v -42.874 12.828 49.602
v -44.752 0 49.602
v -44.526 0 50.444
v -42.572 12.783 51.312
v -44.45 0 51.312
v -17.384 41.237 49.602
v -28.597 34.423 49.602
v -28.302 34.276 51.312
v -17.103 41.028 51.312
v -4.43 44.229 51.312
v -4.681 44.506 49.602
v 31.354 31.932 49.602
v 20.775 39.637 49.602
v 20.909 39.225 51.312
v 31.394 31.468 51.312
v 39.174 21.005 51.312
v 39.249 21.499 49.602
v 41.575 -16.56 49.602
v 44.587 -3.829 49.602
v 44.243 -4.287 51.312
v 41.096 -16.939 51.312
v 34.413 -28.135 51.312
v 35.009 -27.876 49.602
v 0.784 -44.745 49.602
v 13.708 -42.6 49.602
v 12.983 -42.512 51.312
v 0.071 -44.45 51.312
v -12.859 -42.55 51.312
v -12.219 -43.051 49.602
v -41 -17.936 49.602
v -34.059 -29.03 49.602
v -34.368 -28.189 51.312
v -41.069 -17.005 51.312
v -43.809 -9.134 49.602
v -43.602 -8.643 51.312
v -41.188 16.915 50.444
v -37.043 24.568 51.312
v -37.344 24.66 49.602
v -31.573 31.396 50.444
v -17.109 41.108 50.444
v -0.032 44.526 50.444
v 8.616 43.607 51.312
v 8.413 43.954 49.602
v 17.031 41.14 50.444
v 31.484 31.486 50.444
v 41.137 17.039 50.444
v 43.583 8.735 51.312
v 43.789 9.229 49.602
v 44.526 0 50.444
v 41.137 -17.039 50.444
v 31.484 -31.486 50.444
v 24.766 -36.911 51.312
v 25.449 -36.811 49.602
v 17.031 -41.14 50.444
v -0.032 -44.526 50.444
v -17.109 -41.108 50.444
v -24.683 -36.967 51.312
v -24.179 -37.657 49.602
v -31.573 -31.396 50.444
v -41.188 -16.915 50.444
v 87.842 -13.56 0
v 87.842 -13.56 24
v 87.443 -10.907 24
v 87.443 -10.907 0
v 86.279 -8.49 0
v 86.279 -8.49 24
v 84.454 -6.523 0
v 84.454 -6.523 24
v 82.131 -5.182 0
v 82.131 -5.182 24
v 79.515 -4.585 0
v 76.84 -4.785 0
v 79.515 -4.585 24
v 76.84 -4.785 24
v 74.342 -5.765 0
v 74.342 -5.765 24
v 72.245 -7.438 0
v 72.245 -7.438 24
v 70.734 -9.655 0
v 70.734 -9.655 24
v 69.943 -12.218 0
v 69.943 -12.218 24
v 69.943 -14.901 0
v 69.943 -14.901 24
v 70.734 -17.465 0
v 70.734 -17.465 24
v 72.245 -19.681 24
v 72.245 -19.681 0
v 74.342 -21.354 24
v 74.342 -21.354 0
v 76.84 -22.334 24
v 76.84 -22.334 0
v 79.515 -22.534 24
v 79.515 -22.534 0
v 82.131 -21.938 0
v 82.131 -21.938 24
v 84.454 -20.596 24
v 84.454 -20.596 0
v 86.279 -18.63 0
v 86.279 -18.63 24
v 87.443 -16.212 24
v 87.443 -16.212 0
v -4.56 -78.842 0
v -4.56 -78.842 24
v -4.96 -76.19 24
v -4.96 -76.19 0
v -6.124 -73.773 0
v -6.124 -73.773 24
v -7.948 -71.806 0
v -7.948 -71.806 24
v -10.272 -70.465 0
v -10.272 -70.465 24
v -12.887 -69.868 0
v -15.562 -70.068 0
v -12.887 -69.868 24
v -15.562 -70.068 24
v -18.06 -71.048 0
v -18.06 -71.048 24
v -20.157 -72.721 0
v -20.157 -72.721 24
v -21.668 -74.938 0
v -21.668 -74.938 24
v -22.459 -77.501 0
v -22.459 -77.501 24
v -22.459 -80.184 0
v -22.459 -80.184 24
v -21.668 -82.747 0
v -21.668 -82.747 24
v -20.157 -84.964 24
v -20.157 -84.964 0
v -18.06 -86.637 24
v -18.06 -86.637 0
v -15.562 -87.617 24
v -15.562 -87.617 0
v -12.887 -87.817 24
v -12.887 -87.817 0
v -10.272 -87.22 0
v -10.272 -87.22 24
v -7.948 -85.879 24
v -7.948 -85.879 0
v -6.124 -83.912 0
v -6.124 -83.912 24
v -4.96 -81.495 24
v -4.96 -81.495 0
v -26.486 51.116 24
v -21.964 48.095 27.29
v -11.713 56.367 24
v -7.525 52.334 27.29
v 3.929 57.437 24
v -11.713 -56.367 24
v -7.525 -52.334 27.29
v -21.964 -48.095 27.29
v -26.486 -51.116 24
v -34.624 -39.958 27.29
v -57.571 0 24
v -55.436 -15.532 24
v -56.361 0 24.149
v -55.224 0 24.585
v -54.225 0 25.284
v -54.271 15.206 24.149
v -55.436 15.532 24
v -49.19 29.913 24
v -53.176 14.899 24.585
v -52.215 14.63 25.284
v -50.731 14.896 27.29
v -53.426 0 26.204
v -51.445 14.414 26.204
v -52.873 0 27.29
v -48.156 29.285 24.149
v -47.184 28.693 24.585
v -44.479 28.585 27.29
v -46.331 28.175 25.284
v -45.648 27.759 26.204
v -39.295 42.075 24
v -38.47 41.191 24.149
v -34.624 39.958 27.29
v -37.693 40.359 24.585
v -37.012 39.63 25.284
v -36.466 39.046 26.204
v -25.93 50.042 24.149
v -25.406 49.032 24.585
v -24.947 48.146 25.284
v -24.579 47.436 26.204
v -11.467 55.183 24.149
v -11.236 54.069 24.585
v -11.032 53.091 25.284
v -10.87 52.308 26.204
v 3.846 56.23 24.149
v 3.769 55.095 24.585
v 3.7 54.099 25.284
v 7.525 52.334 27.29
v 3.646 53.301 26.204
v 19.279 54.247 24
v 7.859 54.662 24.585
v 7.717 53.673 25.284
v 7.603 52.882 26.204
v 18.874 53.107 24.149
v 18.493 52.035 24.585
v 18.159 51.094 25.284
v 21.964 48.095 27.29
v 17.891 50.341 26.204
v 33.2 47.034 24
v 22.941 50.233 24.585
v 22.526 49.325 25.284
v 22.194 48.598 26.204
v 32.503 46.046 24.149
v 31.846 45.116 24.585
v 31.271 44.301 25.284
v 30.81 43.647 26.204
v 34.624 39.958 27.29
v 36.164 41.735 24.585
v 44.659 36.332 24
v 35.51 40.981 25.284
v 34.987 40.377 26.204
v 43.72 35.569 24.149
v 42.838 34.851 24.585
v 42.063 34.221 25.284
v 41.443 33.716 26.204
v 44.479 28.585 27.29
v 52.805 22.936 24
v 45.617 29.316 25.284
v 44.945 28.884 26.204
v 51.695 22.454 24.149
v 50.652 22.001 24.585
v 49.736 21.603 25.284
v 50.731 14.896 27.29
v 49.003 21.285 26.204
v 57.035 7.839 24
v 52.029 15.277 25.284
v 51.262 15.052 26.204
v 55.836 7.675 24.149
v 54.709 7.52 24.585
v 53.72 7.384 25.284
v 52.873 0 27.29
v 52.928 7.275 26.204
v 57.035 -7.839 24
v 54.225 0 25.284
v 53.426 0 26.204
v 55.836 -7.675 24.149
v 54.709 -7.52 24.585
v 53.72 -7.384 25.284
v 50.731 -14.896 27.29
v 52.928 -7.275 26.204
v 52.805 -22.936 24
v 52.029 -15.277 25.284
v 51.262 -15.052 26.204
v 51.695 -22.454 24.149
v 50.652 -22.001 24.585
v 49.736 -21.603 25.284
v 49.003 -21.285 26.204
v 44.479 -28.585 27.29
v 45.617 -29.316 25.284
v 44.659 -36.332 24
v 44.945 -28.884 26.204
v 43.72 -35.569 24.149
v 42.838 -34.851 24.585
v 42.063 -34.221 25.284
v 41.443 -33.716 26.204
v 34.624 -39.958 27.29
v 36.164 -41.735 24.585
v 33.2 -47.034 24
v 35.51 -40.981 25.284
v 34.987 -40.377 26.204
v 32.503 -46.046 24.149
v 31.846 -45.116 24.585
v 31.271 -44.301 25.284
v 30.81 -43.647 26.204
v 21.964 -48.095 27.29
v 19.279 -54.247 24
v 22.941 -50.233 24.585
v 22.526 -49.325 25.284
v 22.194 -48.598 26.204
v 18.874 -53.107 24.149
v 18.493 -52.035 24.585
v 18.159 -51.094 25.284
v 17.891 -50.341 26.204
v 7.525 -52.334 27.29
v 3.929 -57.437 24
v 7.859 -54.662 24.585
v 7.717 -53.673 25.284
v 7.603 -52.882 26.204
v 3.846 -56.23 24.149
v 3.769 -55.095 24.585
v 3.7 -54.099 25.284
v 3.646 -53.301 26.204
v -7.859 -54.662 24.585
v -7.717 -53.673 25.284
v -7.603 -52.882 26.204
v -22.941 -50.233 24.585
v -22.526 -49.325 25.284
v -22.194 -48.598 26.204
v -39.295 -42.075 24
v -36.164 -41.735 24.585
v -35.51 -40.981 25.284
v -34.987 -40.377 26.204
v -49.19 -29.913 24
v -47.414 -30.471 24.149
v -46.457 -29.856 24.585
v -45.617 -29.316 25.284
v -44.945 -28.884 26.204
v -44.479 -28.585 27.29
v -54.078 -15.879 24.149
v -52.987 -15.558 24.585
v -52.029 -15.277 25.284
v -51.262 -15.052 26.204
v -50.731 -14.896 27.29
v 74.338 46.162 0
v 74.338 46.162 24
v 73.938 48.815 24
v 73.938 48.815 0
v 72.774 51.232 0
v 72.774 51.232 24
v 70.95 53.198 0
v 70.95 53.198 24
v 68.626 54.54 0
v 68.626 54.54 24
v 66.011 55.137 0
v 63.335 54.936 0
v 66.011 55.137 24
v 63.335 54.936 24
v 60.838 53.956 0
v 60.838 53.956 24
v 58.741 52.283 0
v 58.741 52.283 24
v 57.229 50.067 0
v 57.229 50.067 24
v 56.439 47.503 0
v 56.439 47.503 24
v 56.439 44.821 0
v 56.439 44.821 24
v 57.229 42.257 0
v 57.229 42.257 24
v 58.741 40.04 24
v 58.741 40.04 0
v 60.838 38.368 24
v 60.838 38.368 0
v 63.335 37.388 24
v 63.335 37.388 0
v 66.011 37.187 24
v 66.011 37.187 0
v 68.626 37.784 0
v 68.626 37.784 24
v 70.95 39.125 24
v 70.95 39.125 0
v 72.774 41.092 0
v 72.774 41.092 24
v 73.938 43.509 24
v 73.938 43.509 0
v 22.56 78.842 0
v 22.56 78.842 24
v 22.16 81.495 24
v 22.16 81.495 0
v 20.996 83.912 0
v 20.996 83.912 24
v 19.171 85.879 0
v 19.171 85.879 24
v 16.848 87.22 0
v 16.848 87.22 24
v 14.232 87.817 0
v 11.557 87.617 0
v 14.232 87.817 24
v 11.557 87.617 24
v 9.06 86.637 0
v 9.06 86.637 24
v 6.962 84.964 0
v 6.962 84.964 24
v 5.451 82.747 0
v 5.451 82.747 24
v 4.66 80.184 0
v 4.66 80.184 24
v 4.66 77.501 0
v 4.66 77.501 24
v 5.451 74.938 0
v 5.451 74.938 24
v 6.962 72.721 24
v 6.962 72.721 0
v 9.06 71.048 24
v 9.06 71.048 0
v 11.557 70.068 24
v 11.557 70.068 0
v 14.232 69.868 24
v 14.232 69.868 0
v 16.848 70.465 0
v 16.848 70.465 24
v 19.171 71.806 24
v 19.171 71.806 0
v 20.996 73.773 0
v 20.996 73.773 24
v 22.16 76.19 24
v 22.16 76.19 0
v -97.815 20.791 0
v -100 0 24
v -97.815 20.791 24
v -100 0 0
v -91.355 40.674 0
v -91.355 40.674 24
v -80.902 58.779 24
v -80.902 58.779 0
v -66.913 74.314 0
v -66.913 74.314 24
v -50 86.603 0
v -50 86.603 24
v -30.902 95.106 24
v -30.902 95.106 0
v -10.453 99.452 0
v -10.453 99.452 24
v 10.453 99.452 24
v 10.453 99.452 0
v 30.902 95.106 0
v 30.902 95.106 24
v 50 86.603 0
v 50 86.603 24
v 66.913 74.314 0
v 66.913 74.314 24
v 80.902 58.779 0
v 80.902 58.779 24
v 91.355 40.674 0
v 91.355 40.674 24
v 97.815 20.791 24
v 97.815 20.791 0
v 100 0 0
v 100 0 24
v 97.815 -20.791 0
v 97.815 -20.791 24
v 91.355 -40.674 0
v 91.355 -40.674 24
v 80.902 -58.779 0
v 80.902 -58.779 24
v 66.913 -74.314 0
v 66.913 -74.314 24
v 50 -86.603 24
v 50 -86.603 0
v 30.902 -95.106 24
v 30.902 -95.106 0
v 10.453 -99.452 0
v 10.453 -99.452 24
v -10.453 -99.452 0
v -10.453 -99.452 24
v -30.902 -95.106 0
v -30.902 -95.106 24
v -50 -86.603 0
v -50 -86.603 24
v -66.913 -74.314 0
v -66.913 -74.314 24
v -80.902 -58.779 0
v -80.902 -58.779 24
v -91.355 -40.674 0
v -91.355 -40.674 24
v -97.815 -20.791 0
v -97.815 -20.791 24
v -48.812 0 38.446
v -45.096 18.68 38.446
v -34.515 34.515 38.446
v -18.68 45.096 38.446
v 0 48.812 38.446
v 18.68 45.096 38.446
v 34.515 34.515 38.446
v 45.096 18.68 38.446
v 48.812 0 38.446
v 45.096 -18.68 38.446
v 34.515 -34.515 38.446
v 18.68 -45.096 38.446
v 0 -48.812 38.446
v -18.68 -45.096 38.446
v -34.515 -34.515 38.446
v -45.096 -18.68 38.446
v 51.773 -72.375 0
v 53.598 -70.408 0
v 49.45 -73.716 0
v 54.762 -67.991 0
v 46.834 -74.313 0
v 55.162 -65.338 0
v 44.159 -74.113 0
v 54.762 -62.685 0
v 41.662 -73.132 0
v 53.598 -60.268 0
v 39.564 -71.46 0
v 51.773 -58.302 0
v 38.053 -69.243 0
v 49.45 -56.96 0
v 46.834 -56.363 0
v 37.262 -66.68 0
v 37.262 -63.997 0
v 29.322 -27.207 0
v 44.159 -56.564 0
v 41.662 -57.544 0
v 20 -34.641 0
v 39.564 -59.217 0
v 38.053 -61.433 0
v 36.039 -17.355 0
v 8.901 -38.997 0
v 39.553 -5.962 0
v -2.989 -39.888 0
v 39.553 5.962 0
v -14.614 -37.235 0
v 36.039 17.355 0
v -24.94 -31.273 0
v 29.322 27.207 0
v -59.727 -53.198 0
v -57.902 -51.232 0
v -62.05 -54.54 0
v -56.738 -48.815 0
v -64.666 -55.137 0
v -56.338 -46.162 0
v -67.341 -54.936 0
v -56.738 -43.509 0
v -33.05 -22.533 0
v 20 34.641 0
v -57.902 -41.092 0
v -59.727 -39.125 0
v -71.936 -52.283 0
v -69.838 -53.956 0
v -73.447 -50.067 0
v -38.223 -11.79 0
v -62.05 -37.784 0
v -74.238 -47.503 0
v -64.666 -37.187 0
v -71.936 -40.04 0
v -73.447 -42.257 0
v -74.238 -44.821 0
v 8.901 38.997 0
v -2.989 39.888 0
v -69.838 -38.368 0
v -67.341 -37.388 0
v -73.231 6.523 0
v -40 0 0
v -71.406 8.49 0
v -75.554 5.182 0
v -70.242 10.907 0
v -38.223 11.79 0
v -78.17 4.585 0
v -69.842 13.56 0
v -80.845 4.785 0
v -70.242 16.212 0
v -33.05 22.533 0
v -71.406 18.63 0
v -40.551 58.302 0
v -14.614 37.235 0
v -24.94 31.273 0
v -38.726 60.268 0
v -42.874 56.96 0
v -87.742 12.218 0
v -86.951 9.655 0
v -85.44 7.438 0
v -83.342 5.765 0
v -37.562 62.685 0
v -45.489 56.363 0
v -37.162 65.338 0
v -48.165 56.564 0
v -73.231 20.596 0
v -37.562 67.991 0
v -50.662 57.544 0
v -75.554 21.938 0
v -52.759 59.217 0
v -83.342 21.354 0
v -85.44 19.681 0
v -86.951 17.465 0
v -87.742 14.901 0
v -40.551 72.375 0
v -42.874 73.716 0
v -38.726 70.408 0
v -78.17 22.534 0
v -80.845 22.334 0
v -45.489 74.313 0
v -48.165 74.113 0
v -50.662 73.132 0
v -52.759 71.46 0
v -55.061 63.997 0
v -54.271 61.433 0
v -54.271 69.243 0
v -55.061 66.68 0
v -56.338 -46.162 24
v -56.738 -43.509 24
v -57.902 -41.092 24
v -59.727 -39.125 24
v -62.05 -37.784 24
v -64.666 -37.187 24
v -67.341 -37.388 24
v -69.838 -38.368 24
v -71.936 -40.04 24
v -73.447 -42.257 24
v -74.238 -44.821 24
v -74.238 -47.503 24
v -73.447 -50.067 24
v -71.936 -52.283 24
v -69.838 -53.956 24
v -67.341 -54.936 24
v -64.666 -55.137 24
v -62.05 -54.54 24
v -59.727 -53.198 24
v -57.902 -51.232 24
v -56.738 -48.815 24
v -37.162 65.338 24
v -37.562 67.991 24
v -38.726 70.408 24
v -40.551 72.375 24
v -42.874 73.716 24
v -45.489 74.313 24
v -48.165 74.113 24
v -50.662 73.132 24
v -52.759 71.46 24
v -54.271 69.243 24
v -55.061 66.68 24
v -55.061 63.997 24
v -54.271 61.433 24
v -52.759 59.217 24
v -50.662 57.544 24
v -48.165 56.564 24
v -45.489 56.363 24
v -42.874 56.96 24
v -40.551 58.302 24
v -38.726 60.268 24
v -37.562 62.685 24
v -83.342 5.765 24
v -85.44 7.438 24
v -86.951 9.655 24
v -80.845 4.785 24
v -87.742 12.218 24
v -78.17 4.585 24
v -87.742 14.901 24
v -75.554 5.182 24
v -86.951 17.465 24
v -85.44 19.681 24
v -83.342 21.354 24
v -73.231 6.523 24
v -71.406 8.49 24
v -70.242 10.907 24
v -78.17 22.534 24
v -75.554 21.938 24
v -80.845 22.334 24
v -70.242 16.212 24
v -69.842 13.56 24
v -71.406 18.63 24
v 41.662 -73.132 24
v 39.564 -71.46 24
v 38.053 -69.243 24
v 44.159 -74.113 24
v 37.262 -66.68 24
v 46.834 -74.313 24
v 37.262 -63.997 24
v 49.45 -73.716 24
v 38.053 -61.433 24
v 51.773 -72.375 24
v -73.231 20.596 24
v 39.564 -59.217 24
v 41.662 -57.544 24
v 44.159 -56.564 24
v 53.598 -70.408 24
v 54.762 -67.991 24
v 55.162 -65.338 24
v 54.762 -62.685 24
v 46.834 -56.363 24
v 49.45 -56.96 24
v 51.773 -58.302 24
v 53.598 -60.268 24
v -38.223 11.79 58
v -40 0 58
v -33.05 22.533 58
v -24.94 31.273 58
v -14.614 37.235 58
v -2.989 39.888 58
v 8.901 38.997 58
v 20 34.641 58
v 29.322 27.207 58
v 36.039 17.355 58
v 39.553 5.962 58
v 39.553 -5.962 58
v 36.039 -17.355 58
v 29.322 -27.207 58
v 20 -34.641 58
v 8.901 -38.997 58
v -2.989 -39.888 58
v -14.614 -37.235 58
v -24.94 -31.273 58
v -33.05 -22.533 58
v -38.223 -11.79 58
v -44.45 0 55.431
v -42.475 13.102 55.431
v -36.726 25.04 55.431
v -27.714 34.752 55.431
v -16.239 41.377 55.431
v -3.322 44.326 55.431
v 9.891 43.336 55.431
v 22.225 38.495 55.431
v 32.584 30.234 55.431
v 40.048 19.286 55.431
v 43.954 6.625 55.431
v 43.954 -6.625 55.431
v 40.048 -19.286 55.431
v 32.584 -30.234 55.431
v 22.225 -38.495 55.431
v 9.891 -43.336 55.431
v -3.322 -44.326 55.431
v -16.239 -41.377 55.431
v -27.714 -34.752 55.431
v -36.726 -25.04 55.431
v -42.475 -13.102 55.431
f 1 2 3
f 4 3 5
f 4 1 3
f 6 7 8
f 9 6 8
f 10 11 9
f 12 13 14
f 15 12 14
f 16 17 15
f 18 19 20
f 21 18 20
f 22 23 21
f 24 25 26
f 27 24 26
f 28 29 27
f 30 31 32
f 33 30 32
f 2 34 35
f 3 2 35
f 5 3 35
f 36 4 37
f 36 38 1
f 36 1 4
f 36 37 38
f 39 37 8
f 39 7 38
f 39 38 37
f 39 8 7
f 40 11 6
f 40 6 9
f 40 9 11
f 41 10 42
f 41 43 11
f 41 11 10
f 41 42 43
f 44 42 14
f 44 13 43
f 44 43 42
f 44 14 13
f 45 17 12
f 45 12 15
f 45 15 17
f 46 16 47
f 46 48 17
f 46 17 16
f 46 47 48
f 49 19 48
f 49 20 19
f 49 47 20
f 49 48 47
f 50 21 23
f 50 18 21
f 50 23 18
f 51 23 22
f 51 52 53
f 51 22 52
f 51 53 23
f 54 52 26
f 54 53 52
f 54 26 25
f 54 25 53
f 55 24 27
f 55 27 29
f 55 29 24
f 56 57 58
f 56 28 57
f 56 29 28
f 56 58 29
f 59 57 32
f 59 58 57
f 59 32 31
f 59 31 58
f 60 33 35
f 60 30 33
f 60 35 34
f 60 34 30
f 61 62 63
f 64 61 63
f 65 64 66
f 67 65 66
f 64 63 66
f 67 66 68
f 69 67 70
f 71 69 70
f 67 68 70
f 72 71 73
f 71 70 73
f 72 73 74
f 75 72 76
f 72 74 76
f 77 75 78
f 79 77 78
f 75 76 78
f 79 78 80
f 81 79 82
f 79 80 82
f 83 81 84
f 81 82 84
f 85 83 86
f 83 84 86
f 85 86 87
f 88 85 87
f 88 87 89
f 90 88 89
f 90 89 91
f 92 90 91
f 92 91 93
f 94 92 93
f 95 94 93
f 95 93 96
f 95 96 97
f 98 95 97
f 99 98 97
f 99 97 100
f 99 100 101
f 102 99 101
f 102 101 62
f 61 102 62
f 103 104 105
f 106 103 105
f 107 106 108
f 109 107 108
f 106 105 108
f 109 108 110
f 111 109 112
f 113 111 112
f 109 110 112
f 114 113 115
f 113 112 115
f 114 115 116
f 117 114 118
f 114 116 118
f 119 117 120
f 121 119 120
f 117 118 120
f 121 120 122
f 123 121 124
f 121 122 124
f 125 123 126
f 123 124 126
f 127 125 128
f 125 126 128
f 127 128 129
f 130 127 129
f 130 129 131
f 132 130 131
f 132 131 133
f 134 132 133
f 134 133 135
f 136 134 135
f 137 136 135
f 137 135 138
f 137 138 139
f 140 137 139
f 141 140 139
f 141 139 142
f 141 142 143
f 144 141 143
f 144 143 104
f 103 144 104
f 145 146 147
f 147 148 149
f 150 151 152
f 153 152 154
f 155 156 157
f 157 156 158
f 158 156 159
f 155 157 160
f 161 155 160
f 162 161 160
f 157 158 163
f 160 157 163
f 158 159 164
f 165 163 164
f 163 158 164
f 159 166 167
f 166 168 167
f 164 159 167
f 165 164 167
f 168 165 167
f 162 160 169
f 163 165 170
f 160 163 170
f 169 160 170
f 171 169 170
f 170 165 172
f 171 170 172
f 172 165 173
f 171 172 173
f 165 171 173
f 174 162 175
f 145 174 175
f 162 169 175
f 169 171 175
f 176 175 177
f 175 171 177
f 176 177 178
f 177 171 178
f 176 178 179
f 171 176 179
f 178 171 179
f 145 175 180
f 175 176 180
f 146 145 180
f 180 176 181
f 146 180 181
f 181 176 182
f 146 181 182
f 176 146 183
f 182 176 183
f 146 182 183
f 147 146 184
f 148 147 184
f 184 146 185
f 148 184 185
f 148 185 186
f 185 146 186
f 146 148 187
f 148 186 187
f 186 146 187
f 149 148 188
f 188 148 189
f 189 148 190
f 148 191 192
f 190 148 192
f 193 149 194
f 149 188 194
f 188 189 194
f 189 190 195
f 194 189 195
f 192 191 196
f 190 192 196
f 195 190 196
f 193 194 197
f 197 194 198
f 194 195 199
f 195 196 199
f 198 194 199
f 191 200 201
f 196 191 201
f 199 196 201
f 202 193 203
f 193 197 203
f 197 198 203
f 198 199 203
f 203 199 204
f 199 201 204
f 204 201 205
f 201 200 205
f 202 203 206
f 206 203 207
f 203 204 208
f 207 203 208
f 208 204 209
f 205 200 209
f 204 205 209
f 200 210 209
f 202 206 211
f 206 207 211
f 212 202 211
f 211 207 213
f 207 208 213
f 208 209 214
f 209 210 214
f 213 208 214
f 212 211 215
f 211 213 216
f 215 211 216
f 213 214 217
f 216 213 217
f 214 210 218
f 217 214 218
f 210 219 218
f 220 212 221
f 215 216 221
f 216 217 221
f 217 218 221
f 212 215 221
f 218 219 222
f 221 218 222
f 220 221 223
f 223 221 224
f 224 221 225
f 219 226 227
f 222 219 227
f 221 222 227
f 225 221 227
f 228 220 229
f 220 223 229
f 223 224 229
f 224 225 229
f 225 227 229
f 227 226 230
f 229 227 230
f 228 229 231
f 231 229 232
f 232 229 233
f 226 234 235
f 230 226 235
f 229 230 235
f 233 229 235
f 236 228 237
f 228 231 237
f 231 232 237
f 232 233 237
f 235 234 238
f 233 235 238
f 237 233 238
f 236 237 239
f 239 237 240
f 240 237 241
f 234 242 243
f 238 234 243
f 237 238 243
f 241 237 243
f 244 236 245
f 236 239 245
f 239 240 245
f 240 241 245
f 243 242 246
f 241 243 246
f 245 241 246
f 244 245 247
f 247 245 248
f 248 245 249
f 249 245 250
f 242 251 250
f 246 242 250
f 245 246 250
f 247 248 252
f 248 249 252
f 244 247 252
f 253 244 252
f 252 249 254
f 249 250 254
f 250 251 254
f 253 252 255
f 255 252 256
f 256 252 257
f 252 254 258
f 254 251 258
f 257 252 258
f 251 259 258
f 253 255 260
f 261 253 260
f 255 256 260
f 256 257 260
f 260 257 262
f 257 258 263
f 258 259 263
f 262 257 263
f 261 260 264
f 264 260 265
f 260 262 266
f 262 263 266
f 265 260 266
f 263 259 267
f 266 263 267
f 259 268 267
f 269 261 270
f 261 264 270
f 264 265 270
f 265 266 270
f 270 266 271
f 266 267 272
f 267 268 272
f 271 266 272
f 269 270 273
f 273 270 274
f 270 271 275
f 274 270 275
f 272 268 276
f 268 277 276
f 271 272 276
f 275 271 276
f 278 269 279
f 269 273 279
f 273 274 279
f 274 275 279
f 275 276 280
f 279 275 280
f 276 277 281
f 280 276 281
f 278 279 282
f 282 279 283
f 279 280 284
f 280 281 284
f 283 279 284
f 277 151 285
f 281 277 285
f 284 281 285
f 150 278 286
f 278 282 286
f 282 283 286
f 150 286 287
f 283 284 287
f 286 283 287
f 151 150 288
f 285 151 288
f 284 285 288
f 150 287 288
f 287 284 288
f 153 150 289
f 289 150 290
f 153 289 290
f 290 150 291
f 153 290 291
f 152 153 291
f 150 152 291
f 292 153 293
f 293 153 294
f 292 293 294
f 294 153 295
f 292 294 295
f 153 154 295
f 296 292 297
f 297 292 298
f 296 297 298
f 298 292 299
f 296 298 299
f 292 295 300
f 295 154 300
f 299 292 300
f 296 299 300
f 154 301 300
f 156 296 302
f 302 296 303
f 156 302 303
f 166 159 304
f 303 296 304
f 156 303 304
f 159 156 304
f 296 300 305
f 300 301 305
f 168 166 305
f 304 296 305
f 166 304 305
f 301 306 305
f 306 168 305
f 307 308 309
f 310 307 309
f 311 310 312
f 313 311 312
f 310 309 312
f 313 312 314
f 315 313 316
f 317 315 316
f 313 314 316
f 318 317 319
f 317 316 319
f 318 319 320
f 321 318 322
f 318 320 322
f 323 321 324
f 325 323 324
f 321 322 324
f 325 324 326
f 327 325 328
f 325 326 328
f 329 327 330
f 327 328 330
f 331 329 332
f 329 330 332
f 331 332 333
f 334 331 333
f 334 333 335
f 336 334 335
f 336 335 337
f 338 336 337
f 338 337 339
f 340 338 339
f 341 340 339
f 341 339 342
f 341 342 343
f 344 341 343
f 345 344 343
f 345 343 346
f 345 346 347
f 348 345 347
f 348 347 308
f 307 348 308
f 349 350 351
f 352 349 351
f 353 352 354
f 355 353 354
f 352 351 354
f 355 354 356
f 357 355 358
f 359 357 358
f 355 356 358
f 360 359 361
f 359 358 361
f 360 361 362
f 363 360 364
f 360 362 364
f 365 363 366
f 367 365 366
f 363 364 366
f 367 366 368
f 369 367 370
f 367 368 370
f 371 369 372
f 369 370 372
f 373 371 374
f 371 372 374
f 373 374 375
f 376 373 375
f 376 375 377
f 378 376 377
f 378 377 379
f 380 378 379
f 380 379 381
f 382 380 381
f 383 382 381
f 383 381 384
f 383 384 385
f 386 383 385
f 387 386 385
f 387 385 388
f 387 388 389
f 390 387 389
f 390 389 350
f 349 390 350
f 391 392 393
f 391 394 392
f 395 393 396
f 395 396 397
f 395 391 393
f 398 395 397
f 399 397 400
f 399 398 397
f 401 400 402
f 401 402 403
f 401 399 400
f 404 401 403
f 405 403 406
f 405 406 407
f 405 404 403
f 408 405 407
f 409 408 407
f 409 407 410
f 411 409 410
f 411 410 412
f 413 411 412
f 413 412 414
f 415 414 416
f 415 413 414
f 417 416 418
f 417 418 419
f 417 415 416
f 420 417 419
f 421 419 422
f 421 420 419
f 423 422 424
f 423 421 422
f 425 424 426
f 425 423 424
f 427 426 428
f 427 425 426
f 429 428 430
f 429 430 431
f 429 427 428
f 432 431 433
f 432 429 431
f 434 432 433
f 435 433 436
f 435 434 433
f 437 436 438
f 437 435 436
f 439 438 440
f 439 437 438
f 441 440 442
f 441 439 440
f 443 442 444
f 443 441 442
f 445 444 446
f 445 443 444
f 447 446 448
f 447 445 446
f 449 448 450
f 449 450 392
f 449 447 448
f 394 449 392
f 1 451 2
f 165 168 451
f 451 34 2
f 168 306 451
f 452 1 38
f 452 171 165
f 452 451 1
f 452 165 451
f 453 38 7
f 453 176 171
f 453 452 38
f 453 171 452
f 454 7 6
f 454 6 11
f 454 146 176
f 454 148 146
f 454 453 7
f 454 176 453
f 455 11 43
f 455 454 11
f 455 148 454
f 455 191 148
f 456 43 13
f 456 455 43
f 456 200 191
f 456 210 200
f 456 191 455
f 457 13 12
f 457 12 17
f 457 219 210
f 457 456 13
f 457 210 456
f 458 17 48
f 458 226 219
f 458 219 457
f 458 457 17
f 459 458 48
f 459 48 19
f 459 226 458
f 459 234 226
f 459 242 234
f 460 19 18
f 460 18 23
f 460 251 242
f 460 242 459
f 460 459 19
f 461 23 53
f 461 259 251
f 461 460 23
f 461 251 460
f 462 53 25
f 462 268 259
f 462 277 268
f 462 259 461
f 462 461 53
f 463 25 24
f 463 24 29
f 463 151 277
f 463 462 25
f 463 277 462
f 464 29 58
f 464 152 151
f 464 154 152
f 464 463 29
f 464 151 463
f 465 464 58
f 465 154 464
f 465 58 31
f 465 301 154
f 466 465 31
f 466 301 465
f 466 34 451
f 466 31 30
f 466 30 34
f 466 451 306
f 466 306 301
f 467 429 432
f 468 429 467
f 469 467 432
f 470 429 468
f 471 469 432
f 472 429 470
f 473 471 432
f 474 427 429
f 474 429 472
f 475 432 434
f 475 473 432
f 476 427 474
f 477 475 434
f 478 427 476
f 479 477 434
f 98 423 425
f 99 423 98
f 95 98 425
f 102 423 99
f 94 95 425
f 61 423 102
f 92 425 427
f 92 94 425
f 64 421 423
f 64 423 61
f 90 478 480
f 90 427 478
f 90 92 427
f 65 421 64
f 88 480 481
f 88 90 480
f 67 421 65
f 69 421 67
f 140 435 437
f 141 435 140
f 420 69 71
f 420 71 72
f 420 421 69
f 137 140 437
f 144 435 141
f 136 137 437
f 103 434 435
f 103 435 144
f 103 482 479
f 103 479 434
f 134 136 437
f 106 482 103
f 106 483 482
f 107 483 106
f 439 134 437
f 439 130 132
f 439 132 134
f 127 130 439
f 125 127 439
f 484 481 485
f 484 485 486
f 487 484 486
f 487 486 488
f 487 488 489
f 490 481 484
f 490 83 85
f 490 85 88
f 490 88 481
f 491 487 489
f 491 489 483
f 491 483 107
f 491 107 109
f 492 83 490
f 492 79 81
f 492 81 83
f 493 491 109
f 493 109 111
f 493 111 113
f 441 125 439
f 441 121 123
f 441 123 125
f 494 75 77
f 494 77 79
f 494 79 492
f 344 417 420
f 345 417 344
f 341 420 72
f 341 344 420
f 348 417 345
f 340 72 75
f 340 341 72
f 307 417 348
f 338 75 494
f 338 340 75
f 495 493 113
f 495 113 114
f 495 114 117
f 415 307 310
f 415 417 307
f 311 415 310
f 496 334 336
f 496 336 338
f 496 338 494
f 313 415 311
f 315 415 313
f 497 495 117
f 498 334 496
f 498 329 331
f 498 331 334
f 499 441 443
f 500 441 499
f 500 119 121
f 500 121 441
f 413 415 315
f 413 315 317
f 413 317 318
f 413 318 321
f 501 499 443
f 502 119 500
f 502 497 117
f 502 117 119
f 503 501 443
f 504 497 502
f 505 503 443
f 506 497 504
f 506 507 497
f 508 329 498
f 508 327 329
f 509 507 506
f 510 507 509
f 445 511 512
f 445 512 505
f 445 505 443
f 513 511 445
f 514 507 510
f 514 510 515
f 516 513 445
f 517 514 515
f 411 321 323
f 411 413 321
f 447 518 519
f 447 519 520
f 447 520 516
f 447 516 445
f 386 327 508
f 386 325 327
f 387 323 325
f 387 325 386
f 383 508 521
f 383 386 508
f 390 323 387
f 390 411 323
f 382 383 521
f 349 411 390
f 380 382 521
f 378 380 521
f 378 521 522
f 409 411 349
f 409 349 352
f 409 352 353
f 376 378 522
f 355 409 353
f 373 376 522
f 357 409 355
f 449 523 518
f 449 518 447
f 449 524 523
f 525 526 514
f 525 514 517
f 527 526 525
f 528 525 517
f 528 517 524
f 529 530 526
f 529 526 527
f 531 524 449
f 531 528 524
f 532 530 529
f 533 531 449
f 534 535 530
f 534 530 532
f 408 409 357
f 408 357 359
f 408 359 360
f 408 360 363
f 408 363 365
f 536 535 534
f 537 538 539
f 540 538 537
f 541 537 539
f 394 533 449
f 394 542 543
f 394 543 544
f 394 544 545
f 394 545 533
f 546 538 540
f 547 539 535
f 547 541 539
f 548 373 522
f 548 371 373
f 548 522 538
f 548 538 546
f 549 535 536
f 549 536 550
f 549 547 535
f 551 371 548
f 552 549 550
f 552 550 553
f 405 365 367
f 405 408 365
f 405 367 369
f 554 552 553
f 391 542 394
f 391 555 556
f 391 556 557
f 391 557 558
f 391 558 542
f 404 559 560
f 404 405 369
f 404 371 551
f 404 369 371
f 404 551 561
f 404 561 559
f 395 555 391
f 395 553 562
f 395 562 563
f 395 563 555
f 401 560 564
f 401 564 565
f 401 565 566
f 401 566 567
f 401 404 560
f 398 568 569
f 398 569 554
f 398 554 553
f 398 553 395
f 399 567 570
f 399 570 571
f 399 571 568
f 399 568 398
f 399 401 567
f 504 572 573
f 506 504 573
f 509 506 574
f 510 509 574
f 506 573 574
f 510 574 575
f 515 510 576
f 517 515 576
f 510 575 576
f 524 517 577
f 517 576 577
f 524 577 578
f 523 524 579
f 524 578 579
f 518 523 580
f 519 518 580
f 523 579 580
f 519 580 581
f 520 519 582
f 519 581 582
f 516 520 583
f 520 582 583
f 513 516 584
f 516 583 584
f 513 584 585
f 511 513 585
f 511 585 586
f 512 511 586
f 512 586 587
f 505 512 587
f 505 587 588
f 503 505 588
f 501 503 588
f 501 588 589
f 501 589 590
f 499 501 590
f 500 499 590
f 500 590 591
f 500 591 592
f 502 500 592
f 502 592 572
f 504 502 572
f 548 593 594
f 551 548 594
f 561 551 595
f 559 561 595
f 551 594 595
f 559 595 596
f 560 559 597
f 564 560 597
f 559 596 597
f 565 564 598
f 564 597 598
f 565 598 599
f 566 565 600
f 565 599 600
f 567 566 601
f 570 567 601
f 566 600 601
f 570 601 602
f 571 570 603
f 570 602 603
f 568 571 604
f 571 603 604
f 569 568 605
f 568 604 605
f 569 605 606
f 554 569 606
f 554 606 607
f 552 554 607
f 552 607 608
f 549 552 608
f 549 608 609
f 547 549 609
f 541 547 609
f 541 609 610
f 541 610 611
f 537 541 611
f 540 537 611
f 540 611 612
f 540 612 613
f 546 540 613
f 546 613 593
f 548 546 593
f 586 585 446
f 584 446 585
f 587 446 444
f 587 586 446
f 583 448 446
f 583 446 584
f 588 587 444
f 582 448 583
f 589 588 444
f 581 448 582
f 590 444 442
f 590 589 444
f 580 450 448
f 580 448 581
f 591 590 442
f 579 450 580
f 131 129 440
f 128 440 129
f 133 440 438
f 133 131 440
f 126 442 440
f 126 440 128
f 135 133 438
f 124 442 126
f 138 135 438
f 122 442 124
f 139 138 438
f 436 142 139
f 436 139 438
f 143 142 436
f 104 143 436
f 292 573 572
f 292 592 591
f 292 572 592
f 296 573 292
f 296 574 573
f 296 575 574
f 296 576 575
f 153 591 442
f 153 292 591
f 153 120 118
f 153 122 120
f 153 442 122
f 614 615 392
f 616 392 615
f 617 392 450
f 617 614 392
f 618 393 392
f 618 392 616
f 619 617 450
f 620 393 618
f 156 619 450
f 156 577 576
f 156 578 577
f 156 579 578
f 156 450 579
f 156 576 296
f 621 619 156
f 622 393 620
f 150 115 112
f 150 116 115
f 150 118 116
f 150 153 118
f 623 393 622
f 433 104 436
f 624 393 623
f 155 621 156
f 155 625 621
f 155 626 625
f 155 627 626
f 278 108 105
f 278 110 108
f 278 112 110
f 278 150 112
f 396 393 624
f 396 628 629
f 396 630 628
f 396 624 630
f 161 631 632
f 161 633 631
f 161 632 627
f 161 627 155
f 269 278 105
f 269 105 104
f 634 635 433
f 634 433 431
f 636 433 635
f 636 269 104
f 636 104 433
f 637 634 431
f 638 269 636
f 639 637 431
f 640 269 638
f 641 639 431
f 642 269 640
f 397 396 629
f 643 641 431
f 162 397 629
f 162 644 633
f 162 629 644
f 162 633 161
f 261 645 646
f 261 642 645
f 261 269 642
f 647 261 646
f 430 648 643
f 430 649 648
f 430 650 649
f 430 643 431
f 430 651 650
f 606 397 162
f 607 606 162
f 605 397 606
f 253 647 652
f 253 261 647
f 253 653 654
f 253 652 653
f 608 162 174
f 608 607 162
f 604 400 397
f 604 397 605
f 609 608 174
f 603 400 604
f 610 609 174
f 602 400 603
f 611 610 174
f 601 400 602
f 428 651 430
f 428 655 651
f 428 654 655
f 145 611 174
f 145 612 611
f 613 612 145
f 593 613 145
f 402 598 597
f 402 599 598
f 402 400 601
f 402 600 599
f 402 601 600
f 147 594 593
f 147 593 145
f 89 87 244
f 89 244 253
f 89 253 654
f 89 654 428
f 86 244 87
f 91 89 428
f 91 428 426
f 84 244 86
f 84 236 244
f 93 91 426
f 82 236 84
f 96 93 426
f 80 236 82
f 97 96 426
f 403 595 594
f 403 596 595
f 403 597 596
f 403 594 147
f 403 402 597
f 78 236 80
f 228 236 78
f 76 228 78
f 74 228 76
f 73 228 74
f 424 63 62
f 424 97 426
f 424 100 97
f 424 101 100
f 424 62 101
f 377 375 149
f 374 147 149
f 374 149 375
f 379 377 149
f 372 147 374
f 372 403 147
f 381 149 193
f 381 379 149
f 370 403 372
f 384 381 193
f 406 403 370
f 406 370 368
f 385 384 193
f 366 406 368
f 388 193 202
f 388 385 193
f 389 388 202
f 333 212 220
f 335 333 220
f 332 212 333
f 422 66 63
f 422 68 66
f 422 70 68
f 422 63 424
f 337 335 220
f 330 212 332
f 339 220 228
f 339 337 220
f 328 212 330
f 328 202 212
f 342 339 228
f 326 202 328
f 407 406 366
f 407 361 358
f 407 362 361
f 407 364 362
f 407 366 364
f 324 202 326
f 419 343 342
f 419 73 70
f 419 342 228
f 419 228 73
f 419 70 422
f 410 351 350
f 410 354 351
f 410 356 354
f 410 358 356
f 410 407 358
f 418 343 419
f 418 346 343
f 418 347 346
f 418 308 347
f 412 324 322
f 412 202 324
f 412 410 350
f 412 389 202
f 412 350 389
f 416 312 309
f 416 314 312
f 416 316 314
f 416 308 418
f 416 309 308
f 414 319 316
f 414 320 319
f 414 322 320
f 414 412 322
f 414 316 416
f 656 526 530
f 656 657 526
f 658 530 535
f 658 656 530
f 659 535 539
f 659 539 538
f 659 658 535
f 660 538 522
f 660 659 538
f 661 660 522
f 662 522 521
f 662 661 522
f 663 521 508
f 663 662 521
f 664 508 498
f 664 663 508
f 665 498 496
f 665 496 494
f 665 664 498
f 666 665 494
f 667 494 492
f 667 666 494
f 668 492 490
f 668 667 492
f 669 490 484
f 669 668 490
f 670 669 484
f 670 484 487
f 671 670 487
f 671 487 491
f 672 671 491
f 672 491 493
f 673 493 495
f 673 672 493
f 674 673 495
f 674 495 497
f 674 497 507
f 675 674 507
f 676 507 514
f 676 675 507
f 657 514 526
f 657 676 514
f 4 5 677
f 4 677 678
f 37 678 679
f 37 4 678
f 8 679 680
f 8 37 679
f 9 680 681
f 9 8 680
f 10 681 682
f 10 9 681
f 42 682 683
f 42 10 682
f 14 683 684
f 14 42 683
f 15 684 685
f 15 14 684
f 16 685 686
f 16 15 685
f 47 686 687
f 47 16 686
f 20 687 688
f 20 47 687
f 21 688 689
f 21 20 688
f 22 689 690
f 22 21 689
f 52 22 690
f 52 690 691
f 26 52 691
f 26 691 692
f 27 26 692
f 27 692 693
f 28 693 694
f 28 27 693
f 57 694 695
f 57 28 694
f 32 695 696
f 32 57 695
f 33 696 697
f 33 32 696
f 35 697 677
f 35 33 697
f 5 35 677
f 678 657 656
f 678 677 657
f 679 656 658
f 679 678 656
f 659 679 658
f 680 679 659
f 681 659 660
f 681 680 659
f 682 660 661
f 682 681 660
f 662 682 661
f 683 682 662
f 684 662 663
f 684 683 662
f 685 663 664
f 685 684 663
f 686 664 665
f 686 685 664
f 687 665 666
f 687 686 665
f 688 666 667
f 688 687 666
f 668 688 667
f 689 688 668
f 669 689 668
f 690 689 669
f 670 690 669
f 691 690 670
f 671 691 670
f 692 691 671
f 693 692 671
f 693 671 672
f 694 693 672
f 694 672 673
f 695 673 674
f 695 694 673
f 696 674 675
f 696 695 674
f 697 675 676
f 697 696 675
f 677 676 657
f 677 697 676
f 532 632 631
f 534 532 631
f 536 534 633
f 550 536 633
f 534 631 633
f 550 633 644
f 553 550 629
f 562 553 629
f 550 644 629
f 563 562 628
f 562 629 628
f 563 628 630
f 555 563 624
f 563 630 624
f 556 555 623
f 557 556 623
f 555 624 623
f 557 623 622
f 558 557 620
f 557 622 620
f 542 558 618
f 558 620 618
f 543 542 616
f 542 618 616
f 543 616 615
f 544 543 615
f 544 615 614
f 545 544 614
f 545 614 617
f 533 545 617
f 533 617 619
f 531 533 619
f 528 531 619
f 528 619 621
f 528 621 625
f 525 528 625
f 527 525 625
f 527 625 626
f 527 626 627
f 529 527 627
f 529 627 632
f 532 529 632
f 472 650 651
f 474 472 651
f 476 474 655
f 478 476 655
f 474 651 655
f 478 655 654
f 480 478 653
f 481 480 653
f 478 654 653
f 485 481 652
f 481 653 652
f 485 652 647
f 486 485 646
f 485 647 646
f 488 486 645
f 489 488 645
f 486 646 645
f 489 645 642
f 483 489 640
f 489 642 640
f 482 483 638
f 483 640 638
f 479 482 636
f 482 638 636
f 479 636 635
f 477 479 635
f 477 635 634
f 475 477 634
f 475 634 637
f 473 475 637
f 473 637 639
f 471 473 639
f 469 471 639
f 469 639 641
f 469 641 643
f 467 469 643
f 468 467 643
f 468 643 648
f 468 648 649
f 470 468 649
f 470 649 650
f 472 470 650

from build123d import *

# Parameters (mm, degrees)
F2_R     = 9
F3_DEPTH = 25
F4_R     = 5


with BuildPart() as f1:
    # F0 (on Front) → F1 (revolve)
    with BuildSketch(Plane.XZ):
        Polygon((-100, 0), (-40, 0), (-40, 58), (-44.45, 55.430791), (-44.45, 50.430791), (-54.070021, 24), (-100, 24), align=None)
    revolve(axis=Axis((0, 0, 3.000721), (0, 0, -1)))

    # F2 (on face) → F3 (cut)
    with BuildSketch(Plane.XY.offset(24)):
        with Locations((-46.161917, 65.338177)):
            Circle(F2_R)
        with Locations((-78.842473, 13.559663)):
            Circle(F2_R)
        with Locations((-65.338177, -46.161917)):
            Circle(F2_R)
        with Locations((-13.559663, -78.842473)):
            Circle(F2_R)
        with Locations((46.161917, -65.338177)):
            Circle(F2_R)
        with Locations((78.842473, -13.559663)):
            Circle(F2_R)
        with Locations((65.338177, 46.161917)):
            Circle(F2_R)
        with Locations((13.559663, 78.842473)):
            Circle(F2_R)
    extrude(amount=-F3_DEPTH, mode=Mode.SUBTRACT)

    # F4
    f4_edges = [f1.edges().sort_by_distance(p)[0] for p in [
        (54.070021, 0, 24),
        (44.45, 0, 50.430791),
    ]]
    fillet(f4_edges, radius=F4_R)


solid = f1.part
